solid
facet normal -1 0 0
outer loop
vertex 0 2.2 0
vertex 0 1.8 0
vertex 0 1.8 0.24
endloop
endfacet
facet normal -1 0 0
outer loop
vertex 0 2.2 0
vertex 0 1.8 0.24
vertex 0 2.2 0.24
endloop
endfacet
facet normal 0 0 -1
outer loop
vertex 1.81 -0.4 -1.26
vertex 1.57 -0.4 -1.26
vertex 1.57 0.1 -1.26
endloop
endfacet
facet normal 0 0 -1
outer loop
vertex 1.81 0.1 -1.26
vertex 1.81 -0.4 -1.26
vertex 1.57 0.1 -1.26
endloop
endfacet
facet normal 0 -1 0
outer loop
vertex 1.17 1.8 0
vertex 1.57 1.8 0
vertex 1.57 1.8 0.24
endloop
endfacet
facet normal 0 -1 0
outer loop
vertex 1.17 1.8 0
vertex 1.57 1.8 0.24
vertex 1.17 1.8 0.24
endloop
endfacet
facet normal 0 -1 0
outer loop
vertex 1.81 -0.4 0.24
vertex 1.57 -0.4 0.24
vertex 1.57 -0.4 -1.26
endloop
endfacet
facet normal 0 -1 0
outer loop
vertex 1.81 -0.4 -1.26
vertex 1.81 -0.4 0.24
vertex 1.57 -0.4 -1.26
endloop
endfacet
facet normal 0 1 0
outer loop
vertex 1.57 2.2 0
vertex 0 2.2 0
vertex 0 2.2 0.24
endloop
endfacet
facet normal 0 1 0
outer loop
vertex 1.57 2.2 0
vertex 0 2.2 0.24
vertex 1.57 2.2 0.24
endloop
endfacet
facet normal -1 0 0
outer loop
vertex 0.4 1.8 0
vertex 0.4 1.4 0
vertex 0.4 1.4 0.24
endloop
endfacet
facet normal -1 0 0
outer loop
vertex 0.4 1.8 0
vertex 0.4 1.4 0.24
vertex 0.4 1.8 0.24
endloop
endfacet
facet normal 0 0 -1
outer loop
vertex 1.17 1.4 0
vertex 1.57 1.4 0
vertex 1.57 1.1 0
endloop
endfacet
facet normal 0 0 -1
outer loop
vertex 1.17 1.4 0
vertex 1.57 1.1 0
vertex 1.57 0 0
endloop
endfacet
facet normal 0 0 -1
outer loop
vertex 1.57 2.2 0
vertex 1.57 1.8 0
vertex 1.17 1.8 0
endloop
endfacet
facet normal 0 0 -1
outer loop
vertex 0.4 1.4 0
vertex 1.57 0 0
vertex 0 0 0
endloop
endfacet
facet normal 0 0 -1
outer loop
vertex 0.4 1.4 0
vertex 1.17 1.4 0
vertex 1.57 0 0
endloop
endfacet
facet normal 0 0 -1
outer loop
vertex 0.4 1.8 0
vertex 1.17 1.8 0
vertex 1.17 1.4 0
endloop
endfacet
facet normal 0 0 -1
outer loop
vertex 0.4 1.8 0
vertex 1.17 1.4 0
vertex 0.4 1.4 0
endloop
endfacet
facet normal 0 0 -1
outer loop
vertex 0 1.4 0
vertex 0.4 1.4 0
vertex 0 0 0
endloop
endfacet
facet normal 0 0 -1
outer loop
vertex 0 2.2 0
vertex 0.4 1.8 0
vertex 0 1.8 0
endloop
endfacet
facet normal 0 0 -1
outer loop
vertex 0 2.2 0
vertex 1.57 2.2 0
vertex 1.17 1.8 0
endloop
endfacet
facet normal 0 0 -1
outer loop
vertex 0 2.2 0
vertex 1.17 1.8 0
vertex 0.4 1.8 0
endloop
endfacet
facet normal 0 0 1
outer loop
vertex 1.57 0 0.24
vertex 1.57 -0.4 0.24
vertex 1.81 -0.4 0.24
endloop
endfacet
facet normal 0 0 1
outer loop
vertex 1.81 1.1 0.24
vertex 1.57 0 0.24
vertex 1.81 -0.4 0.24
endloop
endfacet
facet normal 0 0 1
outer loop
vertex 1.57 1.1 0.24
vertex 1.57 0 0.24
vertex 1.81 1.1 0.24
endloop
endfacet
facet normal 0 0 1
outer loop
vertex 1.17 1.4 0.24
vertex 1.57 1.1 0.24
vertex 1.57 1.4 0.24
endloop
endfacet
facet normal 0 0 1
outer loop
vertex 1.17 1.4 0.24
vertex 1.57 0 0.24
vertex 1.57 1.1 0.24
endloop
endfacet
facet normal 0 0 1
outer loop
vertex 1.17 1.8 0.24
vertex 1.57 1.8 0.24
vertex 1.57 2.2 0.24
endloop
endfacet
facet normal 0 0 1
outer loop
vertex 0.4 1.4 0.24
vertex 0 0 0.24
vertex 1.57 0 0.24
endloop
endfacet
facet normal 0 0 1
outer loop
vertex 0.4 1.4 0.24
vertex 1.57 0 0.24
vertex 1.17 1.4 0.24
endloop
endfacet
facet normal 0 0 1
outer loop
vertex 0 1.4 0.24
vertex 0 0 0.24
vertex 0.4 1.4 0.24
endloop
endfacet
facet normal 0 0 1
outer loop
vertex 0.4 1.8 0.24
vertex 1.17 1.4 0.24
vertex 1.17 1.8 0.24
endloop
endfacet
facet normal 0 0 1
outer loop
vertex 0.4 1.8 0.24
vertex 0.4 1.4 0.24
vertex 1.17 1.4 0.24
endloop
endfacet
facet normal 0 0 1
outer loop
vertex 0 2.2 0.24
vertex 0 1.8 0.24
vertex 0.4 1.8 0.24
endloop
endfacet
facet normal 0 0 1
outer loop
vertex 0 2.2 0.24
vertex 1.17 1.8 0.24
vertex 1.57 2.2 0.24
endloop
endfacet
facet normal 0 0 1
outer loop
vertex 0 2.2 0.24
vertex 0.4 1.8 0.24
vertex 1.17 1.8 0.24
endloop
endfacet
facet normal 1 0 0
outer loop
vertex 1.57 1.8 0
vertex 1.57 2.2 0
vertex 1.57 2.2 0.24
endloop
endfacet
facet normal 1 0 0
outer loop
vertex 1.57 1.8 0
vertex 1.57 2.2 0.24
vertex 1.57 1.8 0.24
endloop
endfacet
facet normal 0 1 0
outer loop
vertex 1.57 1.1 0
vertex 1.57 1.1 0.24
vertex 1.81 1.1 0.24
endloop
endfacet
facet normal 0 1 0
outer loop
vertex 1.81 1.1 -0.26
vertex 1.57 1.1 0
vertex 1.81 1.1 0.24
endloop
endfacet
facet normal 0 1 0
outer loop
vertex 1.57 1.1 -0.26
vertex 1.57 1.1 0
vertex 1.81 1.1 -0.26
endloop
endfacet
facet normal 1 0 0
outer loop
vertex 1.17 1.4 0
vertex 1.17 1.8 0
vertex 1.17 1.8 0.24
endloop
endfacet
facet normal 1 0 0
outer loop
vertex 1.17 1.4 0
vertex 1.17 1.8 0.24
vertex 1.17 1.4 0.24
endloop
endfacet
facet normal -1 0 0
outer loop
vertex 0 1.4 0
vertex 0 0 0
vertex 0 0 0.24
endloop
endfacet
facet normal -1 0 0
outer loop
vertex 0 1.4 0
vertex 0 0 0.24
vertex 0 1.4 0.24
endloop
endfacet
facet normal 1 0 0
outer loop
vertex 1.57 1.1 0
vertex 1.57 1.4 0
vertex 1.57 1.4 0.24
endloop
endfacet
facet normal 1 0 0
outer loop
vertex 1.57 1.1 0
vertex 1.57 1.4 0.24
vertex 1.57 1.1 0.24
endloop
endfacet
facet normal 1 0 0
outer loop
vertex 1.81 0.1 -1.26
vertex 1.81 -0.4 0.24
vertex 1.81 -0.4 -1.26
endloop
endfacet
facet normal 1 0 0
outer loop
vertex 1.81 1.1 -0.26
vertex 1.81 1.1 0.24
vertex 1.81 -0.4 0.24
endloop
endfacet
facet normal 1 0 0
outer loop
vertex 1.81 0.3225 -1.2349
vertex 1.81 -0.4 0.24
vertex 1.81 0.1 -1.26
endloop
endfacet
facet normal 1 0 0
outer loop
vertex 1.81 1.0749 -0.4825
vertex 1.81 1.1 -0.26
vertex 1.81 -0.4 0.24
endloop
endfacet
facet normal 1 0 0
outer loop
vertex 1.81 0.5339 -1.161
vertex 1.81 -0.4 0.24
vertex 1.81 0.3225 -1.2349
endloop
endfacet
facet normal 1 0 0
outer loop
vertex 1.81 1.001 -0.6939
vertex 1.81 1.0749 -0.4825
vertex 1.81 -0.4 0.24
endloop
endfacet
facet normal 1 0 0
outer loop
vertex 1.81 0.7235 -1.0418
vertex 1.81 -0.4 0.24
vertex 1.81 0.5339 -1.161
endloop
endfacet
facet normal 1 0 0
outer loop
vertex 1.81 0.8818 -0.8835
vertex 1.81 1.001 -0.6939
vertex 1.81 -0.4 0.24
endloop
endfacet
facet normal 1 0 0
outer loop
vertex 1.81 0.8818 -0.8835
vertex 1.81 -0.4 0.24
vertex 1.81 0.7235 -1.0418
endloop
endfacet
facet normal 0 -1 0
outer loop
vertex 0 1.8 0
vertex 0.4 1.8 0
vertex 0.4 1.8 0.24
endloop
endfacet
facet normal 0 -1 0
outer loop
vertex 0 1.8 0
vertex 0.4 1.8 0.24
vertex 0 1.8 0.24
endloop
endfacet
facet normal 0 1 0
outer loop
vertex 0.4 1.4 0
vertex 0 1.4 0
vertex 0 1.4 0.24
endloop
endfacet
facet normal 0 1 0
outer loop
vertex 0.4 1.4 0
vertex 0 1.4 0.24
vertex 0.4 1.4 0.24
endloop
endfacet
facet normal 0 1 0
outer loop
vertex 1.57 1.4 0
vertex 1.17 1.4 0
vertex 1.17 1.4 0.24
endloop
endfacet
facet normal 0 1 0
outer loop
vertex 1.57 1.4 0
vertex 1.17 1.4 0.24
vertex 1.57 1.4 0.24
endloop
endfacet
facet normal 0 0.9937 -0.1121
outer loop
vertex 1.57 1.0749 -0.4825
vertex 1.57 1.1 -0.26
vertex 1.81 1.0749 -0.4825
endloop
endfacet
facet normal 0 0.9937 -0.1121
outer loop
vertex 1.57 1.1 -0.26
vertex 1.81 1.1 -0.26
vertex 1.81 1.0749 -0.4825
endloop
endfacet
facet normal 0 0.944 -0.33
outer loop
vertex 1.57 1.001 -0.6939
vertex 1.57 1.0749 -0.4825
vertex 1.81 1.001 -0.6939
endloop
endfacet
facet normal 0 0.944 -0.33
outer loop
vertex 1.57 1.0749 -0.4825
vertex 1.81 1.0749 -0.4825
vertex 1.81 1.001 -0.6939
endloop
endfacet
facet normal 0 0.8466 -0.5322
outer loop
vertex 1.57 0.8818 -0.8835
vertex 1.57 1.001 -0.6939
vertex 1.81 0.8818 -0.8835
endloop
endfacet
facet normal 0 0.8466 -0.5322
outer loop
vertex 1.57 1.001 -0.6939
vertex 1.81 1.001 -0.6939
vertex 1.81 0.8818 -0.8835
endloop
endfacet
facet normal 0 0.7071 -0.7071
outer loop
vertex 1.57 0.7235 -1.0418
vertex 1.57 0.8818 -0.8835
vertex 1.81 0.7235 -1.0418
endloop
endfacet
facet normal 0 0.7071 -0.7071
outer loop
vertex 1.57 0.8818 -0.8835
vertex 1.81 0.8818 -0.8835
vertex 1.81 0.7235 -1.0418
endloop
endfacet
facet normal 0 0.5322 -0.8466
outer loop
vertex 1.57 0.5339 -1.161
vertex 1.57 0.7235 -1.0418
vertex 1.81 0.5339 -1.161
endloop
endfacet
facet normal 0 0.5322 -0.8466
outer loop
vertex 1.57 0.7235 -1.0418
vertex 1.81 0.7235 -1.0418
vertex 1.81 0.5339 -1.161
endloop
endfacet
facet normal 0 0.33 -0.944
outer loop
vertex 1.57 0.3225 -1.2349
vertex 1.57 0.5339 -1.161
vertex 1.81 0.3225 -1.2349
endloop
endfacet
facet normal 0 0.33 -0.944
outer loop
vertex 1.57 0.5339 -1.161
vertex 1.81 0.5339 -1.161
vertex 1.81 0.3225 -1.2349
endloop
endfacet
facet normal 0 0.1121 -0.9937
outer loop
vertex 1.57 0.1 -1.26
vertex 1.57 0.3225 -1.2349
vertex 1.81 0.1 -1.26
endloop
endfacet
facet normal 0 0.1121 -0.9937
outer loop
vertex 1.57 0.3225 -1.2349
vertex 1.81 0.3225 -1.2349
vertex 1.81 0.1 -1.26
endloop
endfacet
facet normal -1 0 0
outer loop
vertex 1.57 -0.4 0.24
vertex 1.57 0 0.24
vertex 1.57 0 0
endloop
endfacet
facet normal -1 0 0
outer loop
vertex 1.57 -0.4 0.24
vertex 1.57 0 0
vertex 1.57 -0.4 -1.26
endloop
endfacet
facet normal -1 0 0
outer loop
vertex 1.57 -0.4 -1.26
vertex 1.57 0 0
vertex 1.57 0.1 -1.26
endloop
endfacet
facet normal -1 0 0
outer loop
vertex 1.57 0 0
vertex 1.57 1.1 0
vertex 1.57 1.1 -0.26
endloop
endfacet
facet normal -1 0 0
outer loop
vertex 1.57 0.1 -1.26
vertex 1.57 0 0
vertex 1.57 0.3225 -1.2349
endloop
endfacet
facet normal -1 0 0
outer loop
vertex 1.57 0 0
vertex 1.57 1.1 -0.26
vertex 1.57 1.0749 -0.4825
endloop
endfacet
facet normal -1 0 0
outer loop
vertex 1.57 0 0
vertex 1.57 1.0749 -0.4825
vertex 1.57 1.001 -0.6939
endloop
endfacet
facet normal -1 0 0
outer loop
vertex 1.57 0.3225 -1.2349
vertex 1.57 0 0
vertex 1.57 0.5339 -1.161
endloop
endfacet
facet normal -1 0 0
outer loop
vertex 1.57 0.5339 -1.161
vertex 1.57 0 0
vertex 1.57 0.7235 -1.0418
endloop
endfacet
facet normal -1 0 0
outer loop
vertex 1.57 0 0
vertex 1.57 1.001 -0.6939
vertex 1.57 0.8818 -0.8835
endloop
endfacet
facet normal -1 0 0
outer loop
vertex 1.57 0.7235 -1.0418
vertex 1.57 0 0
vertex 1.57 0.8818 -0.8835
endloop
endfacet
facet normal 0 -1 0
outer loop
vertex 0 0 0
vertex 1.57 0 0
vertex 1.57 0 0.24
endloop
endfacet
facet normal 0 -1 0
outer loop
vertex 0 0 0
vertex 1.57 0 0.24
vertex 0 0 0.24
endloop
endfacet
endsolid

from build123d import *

# Parameters (mm, degrees)
BOSS_EXTRUDE1_DEPTH = 0.24
SKETCH2_W           = 1.5
SKETCH2_H           = 1.5
BOSS_EXTRUDE2_DEPTH = 0.24
FILLET1_R           = 1


with BuildPart() as part:
    # Sketch1 → Boss-Extrude1 (new body)
    with BuildSketch(Plane.XY):
        Polygon((0, 0), (0, 1.4), (0.4, 1.4), (0.4, 1.8), (0, 1.8), (0, 2.2), (1.57, 2.2), (1.57, 1.8), (1.17, 1.8), (1.17, 1.4), (1.57, 1.4), (1.57, 0), align=None)
    extrude(amount=BOSS_EXTRUDE1_DEPTH)

    # Sketch2 → Boss-Extrude2 (add)
    with BuildSketch(Plane(origin=(1.57, 0, 0), x_dir=(0, 0, -1), z_dir=(1, 0, 0))):
        with Locations((0.51, 0.35)):
            Rectangle(SKETCH2_W, SKETCH2_H)
    extrude(amount=BOSS_EXTRUDE2_DEPTH)

    # Fillet1
    fillet1_edges = [part.edges().sort_by_distance(p)[0] for p in [
        (1.69, 1.1, -1.26),
    ]]
    fillet(fillet1_edges, radius=FILLET1_R)


solid = part.part
